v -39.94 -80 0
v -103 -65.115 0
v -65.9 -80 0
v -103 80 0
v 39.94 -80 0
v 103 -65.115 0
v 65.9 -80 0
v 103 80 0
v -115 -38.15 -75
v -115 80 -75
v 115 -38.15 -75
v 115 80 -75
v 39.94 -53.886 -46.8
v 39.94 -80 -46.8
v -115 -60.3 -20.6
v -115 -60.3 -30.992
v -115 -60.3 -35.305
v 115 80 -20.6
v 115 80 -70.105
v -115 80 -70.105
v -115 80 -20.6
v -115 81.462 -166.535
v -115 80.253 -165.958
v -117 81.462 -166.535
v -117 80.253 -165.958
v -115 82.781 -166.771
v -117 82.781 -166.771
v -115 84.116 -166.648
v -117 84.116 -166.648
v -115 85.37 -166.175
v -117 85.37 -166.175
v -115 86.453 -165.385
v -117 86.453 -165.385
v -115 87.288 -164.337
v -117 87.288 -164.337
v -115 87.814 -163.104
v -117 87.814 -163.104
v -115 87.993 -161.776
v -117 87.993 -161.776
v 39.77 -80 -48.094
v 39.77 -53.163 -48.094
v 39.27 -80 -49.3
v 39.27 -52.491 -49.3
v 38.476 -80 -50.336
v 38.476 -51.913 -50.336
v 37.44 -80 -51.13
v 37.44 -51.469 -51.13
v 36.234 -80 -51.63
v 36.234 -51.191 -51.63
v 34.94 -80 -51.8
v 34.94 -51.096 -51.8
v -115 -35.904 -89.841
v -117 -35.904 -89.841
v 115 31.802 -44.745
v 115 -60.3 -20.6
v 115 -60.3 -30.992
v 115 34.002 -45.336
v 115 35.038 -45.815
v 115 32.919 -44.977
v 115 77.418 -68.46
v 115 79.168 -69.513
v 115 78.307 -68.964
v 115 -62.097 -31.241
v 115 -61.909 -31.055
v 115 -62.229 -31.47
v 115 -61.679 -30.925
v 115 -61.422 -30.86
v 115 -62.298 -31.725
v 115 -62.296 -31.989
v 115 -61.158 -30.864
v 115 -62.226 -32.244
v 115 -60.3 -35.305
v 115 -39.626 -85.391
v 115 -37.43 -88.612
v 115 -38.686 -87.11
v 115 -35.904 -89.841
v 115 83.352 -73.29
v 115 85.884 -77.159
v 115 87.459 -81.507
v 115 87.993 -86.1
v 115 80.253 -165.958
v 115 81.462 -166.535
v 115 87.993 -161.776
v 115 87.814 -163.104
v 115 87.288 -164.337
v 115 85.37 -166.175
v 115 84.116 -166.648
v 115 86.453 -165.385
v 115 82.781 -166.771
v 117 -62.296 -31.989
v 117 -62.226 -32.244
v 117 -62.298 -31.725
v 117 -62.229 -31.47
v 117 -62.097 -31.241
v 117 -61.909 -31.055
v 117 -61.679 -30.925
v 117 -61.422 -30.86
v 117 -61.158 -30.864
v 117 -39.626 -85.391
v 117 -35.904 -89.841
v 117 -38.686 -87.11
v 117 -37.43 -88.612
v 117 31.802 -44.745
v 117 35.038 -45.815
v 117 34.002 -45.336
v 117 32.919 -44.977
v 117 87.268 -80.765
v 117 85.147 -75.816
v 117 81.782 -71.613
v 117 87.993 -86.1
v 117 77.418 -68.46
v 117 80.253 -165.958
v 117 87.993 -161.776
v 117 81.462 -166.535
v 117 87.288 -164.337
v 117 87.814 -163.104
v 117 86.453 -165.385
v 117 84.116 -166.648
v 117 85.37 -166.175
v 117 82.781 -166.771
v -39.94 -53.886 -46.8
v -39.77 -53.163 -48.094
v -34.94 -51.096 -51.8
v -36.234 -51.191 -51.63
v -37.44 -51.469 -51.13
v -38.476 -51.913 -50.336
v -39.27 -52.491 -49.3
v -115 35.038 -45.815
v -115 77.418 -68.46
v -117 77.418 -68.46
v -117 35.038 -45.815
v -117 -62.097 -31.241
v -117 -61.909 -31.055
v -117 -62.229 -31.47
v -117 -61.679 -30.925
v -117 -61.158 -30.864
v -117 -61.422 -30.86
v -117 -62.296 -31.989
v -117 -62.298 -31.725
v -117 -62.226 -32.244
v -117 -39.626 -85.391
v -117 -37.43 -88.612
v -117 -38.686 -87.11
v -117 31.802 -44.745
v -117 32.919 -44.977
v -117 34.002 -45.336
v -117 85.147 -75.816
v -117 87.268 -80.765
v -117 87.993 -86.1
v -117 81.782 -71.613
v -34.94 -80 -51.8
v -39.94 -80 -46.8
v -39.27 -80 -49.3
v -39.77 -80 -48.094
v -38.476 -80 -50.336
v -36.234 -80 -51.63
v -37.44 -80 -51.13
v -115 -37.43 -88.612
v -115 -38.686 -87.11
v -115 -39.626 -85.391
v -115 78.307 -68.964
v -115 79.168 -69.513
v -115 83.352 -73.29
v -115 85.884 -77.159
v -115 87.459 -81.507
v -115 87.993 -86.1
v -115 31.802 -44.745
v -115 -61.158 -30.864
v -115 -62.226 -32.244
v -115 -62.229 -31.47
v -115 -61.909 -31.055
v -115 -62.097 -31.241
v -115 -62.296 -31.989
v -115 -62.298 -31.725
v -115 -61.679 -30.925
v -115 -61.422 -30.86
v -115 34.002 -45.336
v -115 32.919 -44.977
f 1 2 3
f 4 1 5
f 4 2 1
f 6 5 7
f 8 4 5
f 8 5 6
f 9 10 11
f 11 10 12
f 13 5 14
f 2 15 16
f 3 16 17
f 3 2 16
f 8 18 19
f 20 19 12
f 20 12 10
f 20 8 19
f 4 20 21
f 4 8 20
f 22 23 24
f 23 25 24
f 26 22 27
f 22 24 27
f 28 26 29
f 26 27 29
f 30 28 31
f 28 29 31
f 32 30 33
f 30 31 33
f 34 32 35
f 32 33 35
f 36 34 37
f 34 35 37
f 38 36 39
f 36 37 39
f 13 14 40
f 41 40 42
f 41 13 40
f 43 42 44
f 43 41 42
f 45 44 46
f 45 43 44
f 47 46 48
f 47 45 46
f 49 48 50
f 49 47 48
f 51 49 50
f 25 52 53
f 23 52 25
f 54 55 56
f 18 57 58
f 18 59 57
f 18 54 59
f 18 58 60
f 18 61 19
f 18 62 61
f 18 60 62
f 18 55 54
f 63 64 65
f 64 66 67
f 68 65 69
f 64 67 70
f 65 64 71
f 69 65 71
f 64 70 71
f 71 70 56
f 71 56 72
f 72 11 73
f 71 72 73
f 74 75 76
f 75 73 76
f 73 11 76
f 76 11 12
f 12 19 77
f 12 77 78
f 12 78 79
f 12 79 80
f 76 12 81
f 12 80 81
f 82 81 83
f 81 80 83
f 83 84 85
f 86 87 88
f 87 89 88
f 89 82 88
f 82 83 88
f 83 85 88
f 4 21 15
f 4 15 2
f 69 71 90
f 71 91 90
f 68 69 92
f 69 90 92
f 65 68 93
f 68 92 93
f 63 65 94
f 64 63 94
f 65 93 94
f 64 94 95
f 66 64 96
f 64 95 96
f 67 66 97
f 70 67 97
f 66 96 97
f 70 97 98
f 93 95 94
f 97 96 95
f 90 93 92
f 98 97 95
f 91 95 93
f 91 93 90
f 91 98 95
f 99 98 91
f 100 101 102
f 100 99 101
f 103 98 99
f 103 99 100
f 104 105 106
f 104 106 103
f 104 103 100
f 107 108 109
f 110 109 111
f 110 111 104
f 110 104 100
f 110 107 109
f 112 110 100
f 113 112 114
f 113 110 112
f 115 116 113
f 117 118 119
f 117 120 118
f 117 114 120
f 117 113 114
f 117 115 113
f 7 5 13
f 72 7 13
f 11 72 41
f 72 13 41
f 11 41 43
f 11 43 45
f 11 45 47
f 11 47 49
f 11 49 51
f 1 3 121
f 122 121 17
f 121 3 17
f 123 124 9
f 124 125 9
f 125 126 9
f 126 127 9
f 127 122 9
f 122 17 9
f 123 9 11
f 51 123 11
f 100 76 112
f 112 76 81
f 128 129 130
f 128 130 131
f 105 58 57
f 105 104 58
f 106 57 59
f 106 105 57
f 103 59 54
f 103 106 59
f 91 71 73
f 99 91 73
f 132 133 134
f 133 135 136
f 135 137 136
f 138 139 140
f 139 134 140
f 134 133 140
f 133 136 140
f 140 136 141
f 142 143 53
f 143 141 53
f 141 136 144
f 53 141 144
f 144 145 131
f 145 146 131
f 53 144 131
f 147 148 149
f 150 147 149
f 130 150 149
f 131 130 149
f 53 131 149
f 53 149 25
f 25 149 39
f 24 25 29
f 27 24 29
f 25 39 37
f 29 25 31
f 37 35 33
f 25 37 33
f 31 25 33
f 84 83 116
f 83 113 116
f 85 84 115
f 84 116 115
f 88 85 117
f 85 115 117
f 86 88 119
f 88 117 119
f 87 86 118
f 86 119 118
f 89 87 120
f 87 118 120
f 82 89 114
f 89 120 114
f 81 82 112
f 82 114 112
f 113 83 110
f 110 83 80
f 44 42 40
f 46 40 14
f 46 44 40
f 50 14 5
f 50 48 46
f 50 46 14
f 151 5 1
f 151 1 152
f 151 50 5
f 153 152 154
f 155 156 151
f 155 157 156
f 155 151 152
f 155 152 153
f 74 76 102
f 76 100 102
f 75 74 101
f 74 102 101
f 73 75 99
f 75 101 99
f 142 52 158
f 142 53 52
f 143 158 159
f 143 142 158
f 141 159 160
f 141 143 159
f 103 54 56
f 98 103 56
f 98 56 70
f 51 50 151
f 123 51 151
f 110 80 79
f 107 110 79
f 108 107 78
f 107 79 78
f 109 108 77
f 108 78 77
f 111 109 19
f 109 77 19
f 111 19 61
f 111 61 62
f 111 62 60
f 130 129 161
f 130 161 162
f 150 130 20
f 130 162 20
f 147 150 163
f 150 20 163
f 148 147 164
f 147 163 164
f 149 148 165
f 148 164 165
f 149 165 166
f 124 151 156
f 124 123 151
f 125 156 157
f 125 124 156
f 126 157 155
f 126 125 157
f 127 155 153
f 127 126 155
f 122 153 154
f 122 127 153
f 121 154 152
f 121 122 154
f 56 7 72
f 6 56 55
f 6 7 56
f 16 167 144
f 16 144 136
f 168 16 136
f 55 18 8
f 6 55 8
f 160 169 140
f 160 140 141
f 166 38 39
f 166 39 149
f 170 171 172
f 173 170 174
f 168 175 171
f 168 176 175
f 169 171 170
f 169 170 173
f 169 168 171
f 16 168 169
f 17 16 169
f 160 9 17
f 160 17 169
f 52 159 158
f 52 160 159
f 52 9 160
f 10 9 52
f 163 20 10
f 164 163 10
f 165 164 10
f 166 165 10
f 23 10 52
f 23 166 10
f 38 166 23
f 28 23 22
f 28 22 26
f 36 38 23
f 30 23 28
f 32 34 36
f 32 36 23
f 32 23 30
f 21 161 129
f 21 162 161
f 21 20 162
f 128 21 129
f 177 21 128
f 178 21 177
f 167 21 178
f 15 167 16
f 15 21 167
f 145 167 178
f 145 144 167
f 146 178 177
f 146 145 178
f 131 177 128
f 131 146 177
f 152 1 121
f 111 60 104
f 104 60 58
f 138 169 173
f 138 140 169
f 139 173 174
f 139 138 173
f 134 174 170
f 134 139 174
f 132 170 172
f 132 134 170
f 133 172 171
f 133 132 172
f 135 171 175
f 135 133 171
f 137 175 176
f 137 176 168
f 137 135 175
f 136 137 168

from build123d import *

# Parameters (mm, degrees)
BOSS_EXTRUDE1_DEPTH     = 75
CUT_EXTRUDE1_DEPTH      = 159.902485821
CUT_EXTRUDE1_DEPTH_BACK = 159.902485821
CUT_EXTRUDE2_DEPTH      = 159.902485821
CUT_EXTRUDE2_DEPTH_BACK = 159.902485821
BOSS_EXTRUDE3_START     = 115
BOSS_EXTRUDE3_DEPTH     = 2
BOSS_EXTRUDE5_START     = -115
BOSS_EXTRUDE5_DEPTH     = 2
FILLET3_R               = 5
FILLET4_R               = 20
FILLET5_R               = 10
FILLET6_R               = 10
FILLET7_R               = 10
FILLET8_R               = 10
FILLET11_R              = 1
BOSS_EXTRUDE6_REACH     = 266.055
SKETCH7_W               = 79.88
SKETCH7_H               = 51.8
FILLET13_R              = 5


with BuildPart() as part:
    # Sketch2 → Boss-Extrude1 (new body)
    with BuildSketch(Plane.XY):
        Polygon((-115, -60.3), (-65.9, -80), (65.9, -80), (115, -60.3), (115, 80), (-115, 80), align=None)
    extrude(amount=-BOSS_EXTRUDE1_DEPTH)

    # Sketch3 → Cut-Extrude1 (cut, two sides: drawn at the far end of the back side and taken through both)
    with BuildSketch(Plane(origin=(0, 0, 0), x_dir=(0, 0, -1), z_dir=(1, 0, 0)).offset(-CUT_EXTRUDE1_DEPTH_BACK)):
        Polygon((0, -80), (75, -38.15), (75, -80), align=None)
    extrude(amount=CUT_EXTRUDE1_DEPTH + CUT_EXTRUDE1_DEPTH_BACK, mode=Mode.SUBTRACT)

    # Sketch4 → Cut-Extrude2 (cut, two sides: drawn at the far end of the back side and taken through both)
    with BuildSketch(Plane(origin=(0, 0, 0), x_dir=(1, 0, 0), z_dir=(0, 1, 0)).offset(-CUT_EXTRUDE2_DEPTH_BACK)):
        Polygon((-115, 20.6), (-103, 0), (-115, 0), align=None)
        Polygon((115, 20.6), (103, 0), (115, 0), align=None)
    extrude(amount=CUT_EXTRUDE2_DEPTH + CUT_EXTRUDE2_DEPTH_BACK, mode=Mode.SUBTRACT)

    # Sketch5 → Boss-Extrude3 (add)
    with BuildSketch(Plane(origin=(0, 0, 0), x_dir=(0, 0, -1), z_dir=(1, 0, 0)).offset(BOSS_EXTRUDE3_START)):
        Polygon((30.6, -62.9252), (88.18, -38.439520512), (171.03, 87.993161576), (74.11, 87.993161576), (45, 33.512515472), align=None)
    extrude(amount=BOSS_EXTRUDE3_DEPTH)

    # Sketch6 → Boss-Extrude5 (add)
    with BuildSketch(Plane(origin=(0, 0, 0), x_dir=(0, 0, -1), z_dir=(1, 0, 0)).offset(BOSS_EXTRUDE5_START)):
        Polygon((30.6, -62.9252), (88.18, -38.439520512), (171.03, 87.993161576), (74.11, 87.993161576), (45, 33.512515472), align=None)
    extrude(amount=-BOSS_EXTRUDE5_DEPTH)

    # Fillet3
    fillet3_edges = [part.edges().sort_by_distance(p)[0] for p in [
        (116, 87.993161576, -171.03),
        (-116, 87.993161576, -171.03),
    ]]
    fillet(fillet3_edges, radius=FILLET3_R)

    # Fillet4
    # the kernel refuses this fillet: 20 mm, written as the material it takes off along each edge
    with BuildSketch(Plane(origin=(115, 87.993161576, -74.11), x_dir=(0, -0.8819920042873963, 0.4712643678160927), z_dir=(1, 0, 0)), Plane(origin=(-115, 87.993161576, -74.11), x_dir=(0, 0, -1), z_dir=(-1, 0, 0))) as fillet4_piece_1:
        with BuildLine():
            CenterArc((FILLET4_R * 0.599478940414, FILLET4_R), FILLET4_R, 208.116400727, 61.883599273)
            Line((-FILLET4_R * 0.282513063873, FILLET4_R * 0.528735632184), (0, 0))
            Line((0, 0), (FILLET4_R * 0.599478940414, 0))
        make_face()
    extrude(amount=31.973947021, mode=Mode.SUBTRACT)

    # Fillet5
    fillet5_edges = [part.edges().sort_by_distance(p)[0] for p in [
        (116, 33.512515472, -45),
    ]]
    fillet(fillet5_edges, radius=FILLET5_R)

    # Fillet6
    fillet6_edges = [part.edges().sort_by_distance(p)[0] for p in [
        (-116, -38.439520512, -88.18),
    ]]
    fillet(fillet6_edges, radius=FILLET6_R)

    # Fillet7
    fillet7_edges = [part.edges().sort_by_distance(p)[0] for p in [
        (-116, 33.512515472, -45),
    ]]
    fillet(fillet7_edges, radius=FILLET7_R)

    # Fillet8
    fillet8_edges = [part.edges().sort_by_distance(p)[0] for p in [
        (116, -38.439520512, -88.18),
    ]]
    fillet(fillet8_edges, radius=FILLET8_R)

    # Fillet11
    fillet11_edges = [part.edges().sort_by_distance(p)[0] for p in [
        (116, -62.9252, -30.6),
        (-116, -62.9252, -30.6),
    ]]
    fillet(fillet11_edges, radius=FILLET11_R)

    # Sketch7 → Boss-Extrude6 (add, up to next)
    with BuildSketch(Plane(origin=(0, -80, 0), x_dir=(-1, 0, 0), z_dir=(0, -1, 0)), mode=Mode.PRIVATE) as boss_extrude6_sk1:
        with Locations((0, 25.9)):
            Rectangle(SKETCH7_W, SKETCH7_H)
    boss_extrude6_tool1 = extrude(boss_extrude6_sk1.sketch, amount=-BOSS_EXTRUDE6_REACH, mode=Mode.PRIVATE) - part.part
    add(boss_extrude6_tool1.solids().sort_by_distance((0, -80, -25.9))[0])

    # Fillet13
    fillet13_edges = [part.edges().sort_by_distance(p)[0] for p in [
        (39.94, -65.5478, -51.8),
        (-39.94, -65.5478, -51.8),
    ]]
    fillet(fillet13_edges, radius=FILLET13_R)


solid = part.part
